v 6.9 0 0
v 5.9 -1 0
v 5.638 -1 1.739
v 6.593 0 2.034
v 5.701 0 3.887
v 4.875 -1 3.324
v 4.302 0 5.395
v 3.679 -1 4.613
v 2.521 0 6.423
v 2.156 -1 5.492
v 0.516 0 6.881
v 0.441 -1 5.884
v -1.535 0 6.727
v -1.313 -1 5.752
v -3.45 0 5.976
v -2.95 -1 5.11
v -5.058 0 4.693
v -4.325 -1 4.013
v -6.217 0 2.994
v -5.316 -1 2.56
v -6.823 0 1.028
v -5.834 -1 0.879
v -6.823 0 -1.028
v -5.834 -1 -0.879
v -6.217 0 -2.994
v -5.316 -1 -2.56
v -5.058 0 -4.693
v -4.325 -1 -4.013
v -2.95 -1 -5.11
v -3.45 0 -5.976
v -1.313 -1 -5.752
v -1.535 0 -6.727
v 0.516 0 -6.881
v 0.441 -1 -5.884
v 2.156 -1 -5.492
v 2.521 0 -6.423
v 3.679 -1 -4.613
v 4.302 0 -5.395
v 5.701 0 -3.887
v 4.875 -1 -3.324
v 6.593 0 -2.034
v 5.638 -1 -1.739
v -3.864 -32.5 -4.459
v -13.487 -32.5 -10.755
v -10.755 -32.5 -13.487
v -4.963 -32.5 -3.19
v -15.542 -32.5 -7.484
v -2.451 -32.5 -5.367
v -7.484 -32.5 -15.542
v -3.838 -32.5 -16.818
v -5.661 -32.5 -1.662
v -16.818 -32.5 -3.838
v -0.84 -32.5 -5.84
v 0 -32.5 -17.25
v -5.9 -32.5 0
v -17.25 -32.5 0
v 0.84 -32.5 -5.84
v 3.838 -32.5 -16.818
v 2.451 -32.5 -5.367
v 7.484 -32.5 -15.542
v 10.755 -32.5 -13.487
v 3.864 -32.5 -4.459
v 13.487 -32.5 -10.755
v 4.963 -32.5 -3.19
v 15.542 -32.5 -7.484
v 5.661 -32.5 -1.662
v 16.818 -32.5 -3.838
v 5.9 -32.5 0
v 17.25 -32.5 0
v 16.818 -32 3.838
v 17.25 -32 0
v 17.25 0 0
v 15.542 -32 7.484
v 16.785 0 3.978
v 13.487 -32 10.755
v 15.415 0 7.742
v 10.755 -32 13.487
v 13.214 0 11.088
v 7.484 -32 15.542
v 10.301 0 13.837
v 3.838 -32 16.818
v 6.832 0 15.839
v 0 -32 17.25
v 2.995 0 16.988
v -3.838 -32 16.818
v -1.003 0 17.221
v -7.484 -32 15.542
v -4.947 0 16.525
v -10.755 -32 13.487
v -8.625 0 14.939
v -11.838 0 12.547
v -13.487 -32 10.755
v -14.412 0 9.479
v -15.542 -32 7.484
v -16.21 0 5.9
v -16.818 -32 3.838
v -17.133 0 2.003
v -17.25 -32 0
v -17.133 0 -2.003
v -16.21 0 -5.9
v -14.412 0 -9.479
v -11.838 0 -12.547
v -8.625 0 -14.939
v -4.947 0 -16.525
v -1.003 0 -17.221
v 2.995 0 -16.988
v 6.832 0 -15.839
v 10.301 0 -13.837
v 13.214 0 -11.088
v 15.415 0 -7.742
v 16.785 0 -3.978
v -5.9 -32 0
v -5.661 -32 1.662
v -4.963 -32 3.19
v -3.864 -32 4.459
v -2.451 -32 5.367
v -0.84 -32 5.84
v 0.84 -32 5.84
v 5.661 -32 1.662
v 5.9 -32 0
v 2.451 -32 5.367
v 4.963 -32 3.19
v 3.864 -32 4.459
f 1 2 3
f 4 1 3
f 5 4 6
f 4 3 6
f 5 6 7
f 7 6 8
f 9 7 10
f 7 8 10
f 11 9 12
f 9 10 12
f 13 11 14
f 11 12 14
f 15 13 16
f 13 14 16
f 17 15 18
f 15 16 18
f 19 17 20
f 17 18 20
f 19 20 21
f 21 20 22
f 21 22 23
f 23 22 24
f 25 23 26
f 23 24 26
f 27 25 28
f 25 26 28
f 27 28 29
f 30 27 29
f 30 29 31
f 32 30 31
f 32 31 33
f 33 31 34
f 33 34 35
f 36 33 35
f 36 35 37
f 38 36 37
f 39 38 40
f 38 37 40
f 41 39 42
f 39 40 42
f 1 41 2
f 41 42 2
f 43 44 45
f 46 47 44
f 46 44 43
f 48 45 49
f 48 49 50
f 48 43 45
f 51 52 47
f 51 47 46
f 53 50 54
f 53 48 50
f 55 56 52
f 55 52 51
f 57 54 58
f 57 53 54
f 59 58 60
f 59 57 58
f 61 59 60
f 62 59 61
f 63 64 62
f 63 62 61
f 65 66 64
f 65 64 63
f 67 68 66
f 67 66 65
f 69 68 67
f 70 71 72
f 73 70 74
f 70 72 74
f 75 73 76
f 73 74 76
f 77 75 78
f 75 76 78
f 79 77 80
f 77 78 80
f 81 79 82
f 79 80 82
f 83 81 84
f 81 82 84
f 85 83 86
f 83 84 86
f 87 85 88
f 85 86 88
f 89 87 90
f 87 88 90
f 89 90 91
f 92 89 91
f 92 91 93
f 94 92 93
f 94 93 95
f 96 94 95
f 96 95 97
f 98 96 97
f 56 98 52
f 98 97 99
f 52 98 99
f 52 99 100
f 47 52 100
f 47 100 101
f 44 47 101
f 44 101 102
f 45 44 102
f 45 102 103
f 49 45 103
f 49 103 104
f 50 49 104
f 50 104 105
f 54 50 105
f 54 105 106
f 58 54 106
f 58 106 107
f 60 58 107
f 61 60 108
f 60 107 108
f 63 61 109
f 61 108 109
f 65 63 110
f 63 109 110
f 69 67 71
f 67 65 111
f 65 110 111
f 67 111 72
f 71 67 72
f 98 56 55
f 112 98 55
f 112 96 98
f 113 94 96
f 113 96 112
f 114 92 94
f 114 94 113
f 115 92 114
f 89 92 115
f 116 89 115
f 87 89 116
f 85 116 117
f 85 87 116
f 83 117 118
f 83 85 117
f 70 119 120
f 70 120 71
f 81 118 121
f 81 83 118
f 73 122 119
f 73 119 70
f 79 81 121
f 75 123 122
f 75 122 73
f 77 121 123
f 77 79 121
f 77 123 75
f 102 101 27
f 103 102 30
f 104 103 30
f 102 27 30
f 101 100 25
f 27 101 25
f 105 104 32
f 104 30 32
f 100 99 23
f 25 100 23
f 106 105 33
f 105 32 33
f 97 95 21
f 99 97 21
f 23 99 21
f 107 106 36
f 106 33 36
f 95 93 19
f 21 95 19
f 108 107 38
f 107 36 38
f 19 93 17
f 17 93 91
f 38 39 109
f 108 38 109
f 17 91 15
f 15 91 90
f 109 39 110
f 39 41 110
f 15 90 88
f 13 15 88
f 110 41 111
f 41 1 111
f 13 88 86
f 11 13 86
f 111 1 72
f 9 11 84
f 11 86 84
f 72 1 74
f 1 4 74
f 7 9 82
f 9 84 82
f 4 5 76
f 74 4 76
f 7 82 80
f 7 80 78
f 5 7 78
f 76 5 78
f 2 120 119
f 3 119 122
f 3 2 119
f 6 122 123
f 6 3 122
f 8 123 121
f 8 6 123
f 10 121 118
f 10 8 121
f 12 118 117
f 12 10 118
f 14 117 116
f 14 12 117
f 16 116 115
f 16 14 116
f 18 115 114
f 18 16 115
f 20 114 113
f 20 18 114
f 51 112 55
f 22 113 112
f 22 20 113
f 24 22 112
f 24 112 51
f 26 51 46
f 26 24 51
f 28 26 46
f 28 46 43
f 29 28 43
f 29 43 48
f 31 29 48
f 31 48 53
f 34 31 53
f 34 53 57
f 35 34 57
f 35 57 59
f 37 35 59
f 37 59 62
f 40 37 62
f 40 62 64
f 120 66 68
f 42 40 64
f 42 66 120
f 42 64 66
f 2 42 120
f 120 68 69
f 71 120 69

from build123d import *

# Parameters (mm, degrees)
F0_R     = 17.25
F0_R_2   = 5.9
F1_DEPTH = 32.5
F3_DEPTH = 0.5
F4_SIZE  = 1


with BuildPart() as f1:
    # F0 (on Front) → F1 (new body)
    with BuildSketch(Plane.XZ):
        Circle(F0_R)
        Circle(F0_R_2, mode=Mode.SUBTRACT)
    extrude(amount=F1_DEPTH)

    # F2 (on face) → F3 (cut)
    with BuildSketch(Plane.XZ.offset(32.5)):
        with BuildLine():
            ThreePointArc((-5.9, 0), (0, 5.9), (5.9, 0))
            Line((5.9, 0), (17.25, 0))
            ThreePointArc((17.25, 0), (0, 17.25), (-17.25, 0))
            Line((-17.25, 0), (-5.9, 0))
        make_face()
    extrude(amount=-F3_DEPTH, mode=Mode.SUBTRACT)

    # F4
    f4_edges = [f1.edges().sort_by_distance(p)[0] for p in [
        (-5.9, 0, 0),
    ]]
    chamfer(f4_edges, length=F4_SIZE)


solid = f1.part
